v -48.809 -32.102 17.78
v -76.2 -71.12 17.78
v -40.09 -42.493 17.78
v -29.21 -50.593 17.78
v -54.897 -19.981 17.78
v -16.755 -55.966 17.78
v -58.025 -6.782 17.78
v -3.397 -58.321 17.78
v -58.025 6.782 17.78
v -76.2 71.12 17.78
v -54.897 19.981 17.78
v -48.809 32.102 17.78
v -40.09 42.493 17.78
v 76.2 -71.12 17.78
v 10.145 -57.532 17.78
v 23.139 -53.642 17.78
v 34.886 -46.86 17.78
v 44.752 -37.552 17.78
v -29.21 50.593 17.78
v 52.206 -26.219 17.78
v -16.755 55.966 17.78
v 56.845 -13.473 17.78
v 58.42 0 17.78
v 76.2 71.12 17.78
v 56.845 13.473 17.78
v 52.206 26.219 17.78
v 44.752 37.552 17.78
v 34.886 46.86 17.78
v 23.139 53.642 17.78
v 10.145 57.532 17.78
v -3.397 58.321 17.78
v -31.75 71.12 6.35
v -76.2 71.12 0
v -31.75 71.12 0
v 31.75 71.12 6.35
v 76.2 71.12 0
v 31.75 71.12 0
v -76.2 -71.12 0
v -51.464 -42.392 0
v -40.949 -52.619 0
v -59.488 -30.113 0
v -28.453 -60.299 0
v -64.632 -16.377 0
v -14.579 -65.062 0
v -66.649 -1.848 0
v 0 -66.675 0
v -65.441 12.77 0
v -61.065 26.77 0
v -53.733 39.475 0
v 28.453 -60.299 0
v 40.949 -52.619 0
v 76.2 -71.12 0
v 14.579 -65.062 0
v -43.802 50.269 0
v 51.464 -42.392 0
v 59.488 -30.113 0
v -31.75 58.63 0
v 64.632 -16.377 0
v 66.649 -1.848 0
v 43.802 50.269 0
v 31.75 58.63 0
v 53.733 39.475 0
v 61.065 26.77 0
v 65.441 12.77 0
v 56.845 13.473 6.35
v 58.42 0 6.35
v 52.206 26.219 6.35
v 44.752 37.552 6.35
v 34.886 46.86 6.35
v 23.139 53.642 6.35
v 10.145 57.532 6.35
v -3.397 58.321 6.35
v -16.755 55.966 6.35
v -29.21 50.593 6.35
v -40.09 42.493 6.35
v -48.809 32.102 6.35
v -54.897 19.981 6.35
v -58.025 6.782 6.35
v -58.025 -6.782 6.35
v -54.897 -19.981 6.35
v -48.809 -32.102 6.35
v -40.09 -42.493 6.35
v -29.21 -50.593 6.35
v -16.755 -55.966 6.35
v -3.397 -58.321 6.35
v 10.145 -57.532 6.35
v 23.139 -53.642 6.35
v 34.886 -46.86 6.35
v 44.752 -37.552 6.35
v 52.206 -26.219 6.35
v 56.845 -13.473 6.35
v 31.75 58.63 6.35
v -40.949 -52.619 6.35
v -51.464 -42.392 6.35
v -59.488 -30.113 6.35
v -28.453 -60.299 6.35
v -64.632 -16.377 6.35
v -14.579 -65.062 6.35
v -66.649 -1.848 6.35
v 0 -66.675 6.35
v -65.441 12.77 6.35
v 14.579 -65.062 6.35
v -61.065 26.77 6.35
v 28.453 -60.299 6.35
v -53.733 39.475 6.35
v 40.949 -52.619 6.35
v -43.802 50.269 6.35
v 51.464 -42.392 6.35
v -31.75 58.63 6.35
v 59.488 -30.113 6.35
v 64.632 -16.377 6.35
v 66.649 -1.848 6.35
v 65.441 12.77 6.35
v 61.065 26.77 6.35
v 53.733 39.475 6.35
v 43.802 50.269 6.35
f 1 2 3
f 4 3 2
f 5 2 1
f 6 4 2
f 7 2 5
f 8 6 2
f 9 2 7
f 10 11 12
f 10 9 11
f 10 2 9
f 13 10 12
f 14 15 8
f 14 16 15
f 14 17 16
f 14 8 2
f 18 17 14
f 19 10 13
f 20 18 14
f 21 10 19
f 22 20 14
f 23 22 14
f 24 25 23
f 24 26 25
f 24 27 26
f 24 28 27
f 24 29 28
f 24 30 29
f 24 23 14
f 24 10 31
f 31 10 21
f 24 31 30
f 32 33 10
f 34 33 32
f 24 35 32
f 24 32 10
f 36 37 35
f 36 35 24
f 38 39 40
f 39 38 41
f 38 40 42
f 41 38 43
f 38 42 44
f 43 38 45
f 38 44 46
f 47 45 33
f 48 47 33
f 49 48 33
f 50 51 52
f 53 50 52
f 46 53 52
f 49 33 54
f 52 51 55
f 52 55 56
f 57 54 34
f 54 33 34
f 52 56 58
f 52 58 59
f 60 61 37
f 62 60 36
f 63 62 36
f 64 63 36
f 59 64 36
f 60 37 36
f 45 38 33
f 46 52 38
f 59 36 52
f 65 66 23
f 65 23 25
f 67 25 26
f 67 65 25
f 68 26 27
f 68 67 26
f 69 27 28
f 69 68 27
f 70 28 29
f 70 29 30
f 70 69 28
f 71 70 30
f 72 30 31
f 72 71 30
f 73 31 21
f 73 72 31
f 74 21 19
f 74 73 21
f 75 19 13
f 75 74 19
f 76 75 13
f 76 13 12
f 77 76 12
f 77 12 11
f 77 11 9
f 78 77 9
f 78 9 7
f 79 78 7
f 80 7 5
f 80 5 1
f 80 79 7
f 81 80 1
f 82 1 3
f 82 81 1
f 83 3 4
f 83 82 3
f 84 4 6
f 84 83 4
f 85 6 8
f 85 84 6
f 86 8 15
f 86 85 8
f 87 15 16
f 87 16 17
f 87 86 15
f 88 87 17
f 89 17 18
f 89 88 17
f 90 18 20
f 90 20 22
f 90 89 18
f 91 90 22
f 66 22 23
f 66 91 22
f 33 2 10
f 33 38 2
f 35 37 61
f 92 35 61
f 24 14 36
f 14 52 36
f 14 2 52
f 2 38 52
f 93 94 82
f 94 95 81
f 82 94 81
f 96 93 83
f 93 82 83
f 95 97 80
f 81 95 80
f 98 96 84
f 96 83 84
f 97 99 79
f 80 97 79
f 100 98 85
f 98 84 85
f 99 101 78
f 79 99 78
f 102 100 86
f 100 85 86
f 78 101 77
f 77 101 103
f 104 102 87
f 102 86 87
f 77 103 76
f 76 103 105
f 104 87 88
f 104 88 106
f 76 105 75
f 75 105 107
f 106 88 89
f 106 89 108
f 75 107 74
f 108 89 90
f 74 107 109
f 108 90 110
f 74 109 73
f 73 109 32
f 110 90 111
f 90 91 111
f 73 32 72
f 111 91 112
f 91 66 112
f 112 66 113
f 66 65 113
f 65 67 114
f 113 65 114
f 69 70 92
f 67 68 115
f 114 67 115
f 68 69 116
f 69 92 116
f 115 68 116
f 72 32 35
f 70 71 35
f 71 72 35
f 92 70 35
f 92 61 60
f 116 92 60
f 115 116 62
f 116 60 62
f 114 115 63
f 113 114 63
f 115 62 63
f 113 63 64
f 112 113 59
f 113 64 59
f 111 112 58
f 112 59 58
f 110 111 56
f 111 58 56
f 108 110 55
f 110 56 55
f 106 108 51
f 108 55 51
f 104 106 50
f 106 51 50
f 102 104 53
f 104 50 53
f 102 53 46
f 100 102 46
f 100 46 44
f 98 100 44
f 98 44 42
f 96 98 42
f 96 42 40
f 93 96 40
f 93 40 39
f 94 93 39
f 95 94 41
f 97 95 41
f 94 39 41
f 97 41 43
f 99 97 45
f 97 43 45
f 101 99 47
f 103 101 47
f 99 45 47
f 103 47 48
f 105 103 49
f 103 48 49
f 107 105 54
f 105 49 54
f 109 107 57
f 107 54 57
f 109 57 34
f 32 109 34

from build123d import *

# Parameters (mm, degrees)
BOSS_EXTRUDE1_DEPTH = 6.35
SKETCH2_W           = 152.4
SKETCH2_H           = 142.24
SKETCH2_R           = 58.42
BOSS_EXTRUDE2_DEPTH = 11.43


with BuildPart() as part:
    # Sketch1 → Boss-Extrude1 (new body)
    with BuildSketch(Plane.XY):
        with BuildLine():
            Line((-31.75, 71.12), (-76.2, 71.12))
            Line((-76.2, 71.12), (-76.2, -71.12))
            Line((-76.2, -71.12), (76.2, -71.12))
            Line((76.2, -71.12), (76.2, 71.12))
            Line((76.2, 71.12), (31.75, 71.12))
            Line((31.75, 71.12), (31.75, 58.630138368))
            ThreePointArc((31.75, 58.630138368), (0, -66.675), (-31.75, 58.630138368))
            Line((-31.75, 58.630138368), (-31.75, 71.12))
        make_face()
    extrude(amount=BOSS_EXTRUDE1_DEPTH)

    # Sketch2 → Boss-Extrude2 (add)
    with BuildSketch(Plane.XY.offset(6.35)):
        Rectangle(SKETCH2_W, SKETCH2_H)
        Circle(SKETCH2_R, mode=Mode.SUBTRACT)
    extrude(amount=BOSS_EXTRUDE2_DEPTH)


solid = part.part
